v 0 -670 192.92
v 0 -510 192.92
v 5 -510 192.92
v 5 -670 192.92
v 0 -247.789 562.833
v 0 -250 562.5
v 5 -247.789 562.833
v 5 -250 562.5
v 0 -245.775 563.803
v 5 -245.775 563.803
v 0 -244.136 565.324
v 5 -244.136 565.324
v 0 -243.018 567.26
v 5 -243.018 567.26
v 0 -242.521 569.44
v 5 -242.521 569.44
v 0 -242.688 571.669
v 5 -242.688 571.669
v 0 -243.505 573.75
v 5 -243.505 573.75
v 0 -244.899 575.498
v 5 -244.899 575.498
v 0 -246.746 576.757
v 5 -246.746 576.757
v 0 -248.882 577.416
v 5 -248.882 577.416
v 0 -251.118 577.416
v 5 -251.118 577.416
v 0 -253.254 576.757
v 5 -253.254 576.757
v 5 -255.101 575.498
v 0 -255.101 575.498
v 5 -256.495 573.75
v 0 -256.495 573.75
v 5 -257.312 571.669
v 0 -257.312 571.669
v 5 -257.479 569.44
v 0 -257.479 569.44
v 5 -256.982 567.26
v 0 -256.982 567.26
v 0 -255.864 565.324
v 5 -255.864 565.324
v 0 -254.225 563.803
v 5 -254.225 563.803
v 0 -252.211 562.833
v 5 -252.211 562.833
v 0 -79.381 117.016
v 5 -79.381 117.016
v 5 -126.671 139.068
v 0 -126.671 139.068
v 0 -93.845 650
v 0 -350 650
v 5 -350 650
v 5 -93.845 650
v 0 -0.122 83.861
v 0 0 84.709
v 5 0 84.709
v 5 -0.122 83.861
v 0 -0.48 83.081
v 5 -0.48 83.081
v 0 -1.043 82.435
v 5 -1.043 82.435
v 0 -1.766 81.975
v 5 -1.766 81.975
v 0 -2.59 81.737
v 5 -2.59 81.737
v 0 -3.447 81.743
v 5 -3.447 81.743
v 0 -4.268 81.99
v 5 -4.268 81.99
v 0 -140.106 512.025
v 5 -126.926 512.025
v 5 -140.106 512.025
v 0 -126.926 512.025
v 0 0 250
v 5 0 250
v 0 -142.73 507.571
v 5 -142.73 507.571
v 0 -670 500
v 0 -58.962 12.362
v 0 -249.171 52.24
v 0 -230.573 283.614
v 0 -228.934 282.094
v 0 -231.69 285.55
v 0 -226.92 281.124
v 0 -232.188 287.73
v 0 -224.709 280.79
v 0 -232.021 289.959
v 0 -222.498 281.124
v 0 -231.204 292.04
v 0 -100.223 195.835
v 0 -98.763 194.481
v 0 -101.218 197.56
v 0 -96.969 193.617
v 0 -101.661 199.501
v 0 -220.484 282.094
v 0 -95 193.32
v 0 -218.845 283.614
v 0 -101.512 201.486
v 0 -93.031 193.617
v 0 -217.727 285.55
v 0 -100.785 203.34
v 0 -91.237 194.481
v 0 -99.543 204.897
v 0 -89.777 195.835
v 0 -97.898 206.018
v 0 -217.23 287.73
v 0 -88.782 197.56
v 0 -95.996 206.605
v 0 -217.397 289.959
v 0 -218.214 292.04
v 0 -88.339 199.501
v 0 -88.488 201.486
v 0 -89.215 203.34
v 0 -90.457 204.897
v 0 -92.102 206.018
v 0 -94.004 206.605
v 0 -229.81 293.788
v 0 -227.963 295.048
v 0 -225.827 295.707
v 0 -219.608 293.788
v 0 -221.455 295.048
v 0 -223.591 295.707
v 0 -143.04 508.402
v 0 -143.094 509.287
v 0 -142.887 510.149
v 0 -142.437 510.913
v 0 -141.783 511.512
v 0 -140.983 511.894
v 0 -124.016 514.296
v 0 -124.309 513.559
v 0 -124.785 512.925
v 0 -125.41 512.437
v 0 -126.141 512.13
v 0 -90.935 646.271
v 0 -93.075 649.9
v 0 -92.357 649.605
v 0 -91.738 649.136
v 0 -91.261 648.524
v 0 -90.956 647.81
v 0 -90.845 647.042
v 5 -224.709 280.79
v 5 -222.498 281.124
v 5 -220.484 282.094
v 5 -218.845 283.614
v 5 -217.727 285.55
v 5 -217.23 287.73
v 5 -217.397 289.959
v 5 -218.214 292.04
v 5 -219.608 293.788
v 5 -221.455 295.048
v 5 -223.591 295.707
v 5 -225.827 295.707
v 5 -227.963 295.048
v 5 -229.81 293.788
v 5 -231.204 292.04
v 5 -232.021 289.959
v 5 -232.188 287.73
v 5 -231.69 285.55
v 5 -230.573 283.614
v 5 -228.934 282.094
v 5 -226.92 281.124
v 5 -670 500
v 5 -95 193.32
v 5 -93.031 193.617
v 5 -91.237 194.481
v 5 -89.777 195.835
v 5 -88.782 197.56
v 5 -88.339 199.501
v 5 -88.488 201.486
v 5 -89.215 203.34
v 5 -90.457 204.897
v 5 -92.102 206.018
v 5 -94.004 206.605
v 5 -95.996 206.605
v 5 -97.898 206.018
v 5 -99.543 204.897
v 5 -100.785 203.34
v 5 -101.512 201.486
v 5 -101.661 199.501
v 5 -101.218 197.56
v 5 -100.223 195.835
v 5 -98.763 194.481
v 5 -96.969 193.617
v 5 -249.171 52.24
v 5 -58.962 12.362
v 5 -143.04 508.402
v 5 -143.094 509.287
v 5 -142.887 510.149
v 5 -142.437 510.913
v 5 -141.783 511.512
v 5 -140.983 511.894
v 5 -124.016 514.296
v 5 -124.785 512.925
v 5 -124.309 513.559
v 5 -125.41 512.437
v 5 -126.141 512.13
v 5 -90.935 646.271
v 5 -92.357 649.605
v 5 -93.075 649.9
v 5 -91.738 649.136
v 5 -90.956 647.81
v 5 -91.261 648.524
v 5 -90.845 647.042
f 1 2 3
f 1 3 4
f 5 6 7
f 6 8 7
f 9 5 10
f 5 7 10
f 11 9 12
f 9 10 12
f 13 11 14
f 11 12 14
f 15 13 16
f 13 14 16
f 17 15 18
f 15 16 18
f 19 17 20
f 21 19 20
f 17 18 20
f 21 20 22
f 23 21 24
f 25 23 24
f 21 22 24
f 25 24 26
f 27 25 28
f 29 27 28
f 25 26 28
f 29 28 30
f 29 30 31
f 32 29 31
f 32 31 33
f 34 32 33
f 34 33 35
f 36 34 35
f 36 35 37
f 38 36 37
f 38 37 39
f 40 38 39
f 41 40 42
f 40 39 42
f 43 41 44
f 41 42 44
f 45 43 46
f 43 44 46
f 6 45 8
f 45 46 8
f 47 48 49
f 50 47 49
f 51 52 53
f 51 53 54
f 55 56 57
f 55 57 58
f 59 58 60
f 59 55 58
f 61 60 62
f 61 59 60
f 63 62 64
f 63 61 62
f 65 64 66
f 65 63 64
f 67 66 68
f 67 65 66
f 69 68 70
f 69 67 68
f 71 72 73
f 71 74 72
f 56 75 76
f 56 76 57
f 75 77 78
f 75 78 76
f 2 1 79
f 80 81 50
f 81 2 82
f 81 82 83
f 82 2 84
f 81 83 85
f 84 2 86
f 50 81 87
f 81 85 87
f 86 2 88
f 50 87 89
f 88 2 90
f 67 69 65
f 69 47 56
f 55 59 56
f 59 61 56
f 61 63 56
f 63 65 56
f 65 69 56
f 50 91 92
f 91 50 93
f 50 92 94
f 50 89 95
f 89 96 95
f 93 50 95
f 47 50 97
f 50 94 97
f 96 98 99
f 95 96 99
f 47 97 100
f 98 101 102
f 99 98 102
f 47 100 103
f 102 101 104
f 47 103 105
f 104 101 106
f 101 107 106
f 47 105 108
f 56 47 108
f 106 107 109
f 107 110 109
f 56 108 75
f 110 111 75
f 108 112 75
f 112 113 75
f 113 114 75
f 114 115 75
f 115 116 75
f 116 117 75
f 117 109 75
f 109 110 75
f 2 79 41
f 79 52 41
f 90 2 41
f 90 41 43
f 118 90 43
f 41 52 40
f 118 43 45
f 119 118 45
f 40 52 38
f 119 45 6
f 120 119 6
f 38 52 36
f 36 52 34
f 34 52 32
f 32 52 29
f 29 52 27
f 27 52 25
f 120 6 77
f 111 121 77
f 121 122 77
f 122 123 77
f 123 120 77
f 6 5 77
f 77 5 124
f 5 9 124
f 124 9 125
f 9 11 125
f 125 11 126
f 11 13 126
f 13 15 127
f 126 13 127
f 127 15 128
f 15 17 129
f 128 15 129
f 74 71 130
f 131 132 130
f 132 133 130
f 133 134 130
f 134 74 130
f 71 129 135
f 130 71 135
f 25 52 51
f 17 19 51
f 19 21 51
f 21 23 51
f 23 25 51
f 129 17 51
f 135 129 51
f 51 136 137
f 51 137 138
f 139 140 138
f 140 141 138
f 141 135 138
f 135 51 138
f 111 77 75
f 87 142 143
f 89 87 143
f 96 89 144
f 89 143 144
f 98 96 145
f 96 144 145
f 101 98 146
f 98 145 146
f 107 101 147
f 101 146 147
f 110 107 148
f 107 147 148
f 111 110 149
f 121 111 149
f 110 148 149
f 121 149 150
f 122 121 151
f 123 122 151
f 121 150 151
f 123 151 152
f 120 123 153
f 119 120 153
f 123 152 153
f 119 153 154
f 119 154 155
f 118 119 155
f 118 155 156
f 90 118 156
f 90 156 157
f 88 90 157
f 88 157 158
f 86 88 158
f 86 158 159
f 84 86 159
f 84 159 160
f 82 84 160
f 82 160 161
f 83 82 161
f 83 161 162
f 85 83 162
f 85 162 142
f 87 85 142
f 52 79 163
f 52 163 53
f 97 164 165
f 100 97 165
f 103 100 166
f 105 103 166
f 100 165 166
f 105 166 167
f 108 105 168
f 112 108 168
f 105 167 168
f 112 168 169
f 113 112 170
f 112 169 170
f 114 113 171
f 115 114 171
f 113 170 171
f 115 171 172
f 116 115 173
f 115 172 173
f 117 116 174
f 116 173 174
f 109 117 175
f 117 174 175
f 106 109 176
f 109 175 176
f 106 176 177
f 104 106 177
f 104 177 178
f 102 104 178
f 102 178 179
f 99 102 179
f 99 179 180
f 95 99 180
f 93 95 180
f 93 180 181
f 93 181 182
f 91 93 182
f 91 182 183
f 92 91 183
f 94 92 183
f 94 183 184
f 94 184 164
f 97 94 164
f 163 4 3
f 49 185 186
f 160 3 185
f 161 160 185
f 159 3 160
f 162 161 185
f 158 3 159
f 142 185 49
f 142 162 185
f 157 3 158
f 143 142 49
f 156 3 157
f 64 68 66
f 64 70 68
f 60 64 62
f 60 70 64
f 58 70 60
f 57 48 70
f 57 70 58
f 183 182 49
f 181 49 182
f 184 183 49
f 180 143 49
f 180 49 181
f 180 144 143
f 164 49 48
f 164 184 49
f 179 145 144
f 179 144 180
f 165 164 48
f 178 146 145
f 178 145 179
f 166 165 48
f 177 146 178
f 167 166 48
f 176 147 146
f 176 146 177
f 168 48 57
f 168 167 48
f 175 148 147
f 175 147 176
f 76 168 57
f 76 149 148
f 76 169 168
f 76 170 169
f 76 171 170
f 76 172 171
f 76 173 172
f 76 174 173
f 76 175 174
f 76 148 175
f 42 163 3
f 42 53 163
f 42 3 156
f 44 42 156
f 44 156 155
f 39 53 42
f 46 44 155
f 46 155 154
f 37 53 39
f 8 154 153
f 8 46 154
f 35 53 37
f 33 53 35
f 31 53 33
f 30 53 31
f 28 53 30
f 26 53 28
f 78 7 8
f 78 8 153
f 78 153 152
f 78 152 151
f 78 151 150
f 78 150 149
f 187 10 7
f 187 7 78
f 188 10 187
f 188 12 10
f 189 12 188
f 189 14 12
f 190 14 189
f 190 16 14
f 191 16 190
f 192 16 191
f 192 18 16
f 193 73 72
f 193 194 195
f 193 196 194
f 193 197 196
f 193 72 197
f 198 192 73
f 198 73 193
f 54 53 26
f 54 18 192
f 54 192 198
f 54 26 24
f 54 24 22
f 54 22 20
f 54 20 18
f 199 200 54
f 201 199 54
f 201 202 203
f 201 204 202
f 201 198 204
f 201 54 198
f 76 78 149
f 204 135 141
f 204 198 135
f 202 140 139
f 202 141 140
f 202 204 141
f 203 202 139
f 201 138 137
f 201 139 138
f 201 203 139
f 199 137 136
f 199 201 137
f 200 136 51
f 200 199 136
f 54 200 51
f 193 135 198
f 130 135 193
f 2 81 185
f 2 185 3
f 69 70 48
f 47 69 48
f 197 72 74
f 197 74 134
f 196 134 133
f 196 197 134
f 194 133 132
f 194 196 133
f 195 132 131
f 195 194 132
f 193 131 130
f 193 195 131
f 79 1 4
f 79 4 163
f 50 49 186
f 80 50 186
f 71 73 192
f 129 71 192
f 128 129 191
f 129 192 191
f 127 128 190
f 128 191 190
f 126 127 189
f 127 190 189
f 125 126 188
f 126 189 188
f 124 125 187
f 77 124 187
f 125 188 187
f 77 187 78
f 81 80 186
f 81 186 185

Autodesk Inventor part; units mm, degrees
ref_plane "YZ Plane" through (0, 0, 0) normal (1, 0, 0) x (0, 1, 0)
ref_plane "XZ Plane" through (0, 0, 0) normal (0, 1, 0) x (-1, 0, 0)
ref_plane "XY Plane" through (0, 0, 0) normal (0, 0, 1) x (1, 0, 0)
sketch "スケッチ1" plane through (0, 0, 0) normal (1, 0, 0) x (0, 1, 0)
  line L0 (-670, 192.9198) -> (-670, 500)
  line L1 (-670, 500) -> (-350, 650)
  line L2 (-350, 650) -> (-90, 650)
  line L3 (0, 250) -> (0, 0)
  line L4 (-124.5856, 512.0252) -> (-145.1979, 512.0252)
  line L5 (-145.1979, 512.0252) -> (0, 250)
  line L6 (-90, 650) -> (-124.5856, 512.0252)
  line L7 (-249.1712, 52.2397) -> (-510, 192.9198)
  line L8 (-510, 192.9198) -> (-670, 192.9198)
  line L9 (0, 0) -> (-249.1712, 52.2397)
  dimension "d2" = 150
  dimension "d3" = 320
  dimension "d4" = 250
  dimension "d5" = 670
  dimension "d79" = 260
extrude "押し出し1" add sketch "スケッチ1" along normal blind 5
sketch "スケッチ8" plane through (5, 0, 0) normal (1, 0, 0) x (0, 0, -1)
  circle A0 centre (-570, -250) radius 7.5
  circle A1 centre (-288.2903, -224.7089) radius 7.5
  line L0 (0, 0) -> (-250, 0) projected
  line L1 (-570, -250) -> (-290.3837, -264.6541)
  line L2 (-290.3837, -264.6541) -> (-288.2903, -224.7089)
  line L3 (0, -804) -> (0, 134) projected
  dimension "d65" = 15
  dimension "d66" = 15
  dimension "d77" = 250
  dimension "d88" = 40
  dimension "d89" = 280
  dimension "d90" = 3
  dimension "d91" = 570
extrude "押し出し8" cut sketch "スケッチ8" against normal through all
sketch "スケッチ12" plane through (5, 0, 0) normal (1, 0, 0) x (0, 0, -1)
  circle A0 centre (-200, -95) radius 6.6799
  point P0 (0, 0)
  dimension "d84" = 200
  dimension "d85" = 95
extrude "押し出し11" cut sketch "スケッチ12" against normal through all
sketch "スケッチ13" plane through (5, 0, 0) normal (1, 0, 0) x (0, 0, -1)
  line L0 (0, -804) -> (0, 134) projected
  line L1 (130, 0) -> (-780, 0) projected
  line L2 (-80, 0) -> (-121.7476, -89.528)
  line L3 (-121.7476, -89.528) -> (-1.0516, -5.0157)
  line L4 (-52.2397, -249.1712) -> (0, 0) projected
  dimension "d95" = 80
  dimension "d96" = 115
  dimension "d97" = 30
extrude "押し出し12" cut sketch "スケッチ13" against normal through all
fillet "フィレット2" radius 3 6 edges at (2.5, -89.528, 121.7476) (2.5, -5.0157, 1.0516) (2.5, 0, 80) (2.5, -145.1979, 512.0252) (2.5, -124.5856, 512.0252) (2.5, -90, 650)
sketch "スケッチ14" plane through (5, 0, 0) normal (1, 0, 0) x (0, 0, -1)
  line L0 (-117.0159, -79.3808) -> (-81.9901, -4.2679) projected
  line L1 (-52.2397, -249.1712) -> (-2.608, -12.4393) projected
  line L2 (-7.2648, -9.3663) -> (-112.5762, -83.1061) projected
  line L3 (-81.9901, -4.2679) -> (-139.0675, -126.6706)
  line L4 (-139.0675, -126.6706) -> (-12.3616, -58.9618)
  line L5 (-52.2397, -249.1712) -> (-2.608, -12.4393) projected
  line L6 (-12.3616, -58.9618) -> (-2.608, -12.4393)
  line L7 (-2.608, -12.4393) -> (0, 0)
  line L8 (0, 0) -> (-81.9901, -4.2679)
extrude "押し出し13" cut sketch "スケッチ14" against normal through all
properties part number "end_plate" material "木材 (オーク)"
